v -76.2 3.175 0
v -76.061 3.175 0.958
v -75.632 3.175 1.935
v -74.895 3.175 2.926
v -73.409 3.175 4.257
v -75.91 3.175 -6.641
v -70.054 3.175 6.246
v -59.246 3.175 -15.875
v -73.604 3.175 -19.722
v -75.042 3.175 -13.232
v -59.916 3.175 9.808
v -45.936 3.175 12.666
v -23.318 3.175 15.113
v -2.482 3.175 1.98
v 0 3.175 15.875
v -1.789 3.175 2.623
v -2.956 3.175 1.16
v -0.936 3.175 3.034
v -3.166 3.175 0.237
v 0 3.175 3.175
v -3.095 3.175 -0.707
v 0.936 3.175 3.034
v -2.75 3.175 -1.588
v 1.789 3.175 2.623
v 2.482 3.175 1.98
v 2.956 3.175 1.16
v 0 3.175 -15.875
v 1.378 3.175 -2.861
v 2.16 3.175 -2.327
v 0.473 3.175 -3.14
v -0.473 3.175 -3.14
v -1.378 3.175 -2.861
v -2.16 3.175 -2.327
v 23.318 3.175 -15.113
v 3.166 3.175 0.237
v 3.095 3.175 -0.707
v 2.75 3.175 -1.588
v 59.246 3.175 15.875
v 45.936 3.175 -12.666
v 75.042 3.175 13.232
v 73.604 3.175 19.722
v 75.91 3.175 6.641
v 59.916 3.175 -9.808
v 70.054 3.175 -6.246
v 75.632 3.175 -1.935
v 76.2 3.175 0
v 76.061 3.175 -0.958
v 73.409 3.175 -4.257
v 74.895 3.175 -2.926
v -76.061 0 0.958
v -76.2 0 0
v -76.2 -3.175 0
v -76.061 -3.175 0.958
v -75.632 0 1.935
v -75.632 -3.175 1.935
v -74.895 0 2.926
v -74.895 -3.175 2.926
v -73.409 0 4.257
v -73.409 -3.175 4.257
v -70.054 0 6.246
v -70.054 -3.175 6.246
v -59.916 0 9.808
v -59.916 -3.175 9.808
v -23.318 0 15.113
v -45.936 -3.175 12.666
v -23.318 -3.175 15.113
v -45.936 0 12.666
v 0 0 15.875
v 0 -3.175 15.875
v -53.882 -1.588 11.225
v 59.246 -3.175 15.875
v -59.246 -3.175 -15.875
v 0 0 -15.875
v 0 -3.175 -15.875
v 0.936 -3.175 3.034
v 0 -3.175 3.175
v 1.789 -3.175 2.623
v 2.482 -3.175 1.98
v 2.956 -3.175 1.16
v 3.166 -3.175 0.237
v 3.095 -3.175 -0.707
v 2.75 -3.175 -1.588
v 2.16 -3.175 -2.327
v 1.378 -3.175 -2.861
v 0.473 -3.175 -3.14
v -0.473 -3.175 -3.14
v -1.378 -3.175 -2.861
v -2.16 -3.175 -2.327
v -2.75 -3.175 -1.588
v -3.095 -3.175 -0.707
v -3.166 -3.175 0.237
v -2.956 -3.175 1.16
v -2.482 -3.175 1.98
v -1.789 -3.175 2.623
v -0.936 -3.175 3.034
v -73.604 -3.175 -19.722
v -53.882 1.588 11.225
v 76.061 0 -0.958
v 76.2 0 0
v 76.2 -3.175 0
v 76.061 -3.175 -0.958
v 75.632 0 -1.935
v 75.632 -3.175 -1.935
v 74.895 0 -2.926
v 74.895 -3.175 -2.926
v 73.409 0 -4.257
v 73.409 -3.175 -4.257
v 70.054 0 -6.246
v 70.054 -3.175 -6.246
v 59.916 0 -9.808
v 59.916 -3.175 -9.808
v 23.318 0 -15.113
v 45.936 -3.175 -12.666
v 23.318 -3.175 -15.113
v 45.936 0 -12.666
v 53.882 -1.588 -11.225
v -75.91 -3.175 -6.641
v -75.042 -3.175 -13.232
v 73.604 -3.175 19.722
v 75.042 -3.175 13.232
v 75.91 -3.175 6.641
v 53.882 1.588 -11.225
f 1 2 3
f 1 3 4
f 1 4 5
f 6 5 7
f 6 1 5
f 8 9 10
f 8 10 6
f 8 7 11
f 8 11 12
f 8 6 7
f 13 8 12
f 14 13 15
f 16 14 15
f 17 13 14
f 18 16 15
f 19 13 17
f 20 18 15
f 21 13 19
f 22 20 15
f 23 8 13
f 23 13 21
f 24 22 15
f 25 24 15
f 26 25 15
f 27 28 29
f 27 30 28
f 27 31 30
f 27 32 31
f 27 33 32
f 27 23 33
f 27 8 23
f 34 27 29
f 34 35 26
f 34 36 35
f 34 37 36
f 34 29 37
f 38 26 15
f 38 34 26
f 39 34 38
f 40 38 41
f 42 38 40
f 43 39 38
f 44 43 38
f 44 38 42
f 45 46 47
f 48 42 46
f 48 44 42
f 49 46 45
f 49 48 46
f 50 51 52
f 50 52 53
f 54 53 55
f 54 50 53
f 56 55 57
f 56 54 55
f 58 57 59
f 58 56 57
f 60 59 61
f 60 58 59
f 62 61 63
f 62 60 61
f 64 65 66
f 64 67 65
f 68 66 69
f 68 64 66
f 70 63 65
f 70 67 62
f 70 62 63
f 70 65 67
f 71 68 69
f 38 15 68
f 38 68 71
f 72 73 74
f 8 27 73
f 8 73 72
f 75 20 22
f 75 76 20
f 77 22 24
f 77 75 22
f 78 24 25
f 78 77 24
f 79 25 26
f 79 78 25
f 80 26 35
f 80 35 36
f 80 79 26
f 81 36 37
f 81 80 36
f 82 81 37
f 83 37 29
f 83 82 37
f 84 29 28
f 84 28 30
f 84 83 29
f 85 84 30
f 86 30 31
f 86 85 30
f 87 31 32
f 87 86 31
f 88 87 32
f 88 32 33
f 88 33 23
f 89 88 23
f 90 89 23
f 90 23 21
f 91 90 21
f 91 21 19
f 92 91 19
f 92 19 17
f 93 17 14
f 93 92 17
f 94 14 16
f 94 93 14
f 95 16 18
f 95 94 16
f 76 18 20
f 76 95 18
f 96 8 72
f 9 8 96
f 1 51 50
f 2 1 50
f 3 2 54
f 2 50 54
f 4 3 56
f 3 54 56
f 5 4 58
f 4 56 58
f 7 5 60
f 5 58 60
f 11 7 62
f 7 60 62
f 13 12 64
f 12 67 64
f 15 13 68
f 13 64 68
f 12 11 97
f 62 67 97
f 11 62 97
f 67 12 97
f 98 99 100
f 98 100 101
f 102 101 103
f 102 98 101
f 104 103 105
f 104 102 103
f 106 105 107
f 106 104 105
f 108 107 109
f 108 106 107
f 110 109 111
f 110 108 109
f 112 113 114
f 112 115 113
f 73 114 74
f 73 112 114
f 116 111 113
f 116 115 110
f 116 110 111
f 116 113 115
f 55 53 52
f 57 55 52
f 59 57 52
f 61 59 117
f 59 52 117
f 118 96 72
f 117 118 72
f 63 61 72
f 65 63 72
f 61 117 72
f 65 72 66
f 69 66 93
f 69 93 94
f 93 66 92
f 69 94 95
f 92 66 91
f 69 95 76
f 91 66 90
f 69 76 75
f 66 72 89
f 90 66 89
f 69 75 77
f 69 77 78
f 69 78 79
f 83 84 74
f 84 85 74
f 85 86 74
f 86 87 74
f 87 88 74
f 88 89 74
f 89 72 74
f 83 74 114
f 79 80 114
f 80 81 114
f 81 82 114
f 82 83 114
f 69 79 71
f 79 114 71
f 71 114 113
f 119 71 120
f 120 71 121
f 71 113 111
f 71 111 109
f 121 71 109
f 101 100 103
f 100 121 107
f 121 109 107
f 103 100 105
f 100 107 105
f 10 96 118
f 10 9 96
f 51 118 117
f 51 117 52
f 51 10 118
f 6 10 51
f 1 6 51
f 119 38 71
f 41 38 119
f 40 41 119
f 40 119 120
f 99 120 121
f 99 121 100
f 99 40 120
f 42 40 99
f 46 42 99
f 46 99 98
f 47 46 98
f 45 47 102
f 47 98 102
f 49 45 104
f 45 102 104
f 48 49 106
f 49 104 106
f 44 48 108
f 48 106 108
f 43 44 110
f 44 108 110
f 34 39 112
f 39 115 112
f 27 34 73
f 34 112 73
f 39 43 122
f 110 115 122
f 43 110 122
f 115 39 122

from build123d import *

# Parameters (mm, degrees)
SKETCH1_R           = 3.175
BOSS_EXTRUDE1_DEPTH = 3.175


with BuildPart() as part:
    # Sketch1 → Boss-Extrude1 (new, symmetric)
    with BuildSketch(Plane(origin=(0, 0, 0), x_dir=(1, 0, 0), z_dir=(0, 1, 0))):
        with BuildLine():
            Line((0, -15.875), (59.24630657, -15.875))
            Line((59.24630657, -15.875), (73.603547963, -19.722011237))
            ThreePointArc((73.603547963, -19.722011237), (75.548098437, -9.946095847), (76.2, 0))
            add(Edge.make_bspline(
                [(76.2, 0), (76.2, 15.875), (0, 15.875)],
                knots=[3.141592654, 3.141592654, 3.141592654, 4.71238898, 4.71238898, 4.71238898], degree=2, weights=[1, 0.707106781, 1]))
            Line((0, 15.875), (-59.24630657, 15.875))
            Line((-59.24630657, 15.875), (-73.603547963, 19.722011237))
            ThreePointArc((-73.603547963, 19.722011237), (-75.548098437, 9.946095847), (-76.2, 0))
            add(Edge.make_bspline(
                [(-76.2, 0), (-76.2, -15.875), (0, -15.875)],
                knots=[3.141592654, 3.141592654, 3.141592654, 4.71238898, 4.71238898, 4.71238898], degree=2, weights=[1, 0.707106781, 1]))
        make_face()
        with Locations(Location((0, 0, 0), (0, 0, 270))):
            Circle(SKETCH1_R, mode=Mode.SUBTRACT)
    extrude(amount=BOSS_EXTRUDE1_DEPTH, both=True)


solid = part.part
